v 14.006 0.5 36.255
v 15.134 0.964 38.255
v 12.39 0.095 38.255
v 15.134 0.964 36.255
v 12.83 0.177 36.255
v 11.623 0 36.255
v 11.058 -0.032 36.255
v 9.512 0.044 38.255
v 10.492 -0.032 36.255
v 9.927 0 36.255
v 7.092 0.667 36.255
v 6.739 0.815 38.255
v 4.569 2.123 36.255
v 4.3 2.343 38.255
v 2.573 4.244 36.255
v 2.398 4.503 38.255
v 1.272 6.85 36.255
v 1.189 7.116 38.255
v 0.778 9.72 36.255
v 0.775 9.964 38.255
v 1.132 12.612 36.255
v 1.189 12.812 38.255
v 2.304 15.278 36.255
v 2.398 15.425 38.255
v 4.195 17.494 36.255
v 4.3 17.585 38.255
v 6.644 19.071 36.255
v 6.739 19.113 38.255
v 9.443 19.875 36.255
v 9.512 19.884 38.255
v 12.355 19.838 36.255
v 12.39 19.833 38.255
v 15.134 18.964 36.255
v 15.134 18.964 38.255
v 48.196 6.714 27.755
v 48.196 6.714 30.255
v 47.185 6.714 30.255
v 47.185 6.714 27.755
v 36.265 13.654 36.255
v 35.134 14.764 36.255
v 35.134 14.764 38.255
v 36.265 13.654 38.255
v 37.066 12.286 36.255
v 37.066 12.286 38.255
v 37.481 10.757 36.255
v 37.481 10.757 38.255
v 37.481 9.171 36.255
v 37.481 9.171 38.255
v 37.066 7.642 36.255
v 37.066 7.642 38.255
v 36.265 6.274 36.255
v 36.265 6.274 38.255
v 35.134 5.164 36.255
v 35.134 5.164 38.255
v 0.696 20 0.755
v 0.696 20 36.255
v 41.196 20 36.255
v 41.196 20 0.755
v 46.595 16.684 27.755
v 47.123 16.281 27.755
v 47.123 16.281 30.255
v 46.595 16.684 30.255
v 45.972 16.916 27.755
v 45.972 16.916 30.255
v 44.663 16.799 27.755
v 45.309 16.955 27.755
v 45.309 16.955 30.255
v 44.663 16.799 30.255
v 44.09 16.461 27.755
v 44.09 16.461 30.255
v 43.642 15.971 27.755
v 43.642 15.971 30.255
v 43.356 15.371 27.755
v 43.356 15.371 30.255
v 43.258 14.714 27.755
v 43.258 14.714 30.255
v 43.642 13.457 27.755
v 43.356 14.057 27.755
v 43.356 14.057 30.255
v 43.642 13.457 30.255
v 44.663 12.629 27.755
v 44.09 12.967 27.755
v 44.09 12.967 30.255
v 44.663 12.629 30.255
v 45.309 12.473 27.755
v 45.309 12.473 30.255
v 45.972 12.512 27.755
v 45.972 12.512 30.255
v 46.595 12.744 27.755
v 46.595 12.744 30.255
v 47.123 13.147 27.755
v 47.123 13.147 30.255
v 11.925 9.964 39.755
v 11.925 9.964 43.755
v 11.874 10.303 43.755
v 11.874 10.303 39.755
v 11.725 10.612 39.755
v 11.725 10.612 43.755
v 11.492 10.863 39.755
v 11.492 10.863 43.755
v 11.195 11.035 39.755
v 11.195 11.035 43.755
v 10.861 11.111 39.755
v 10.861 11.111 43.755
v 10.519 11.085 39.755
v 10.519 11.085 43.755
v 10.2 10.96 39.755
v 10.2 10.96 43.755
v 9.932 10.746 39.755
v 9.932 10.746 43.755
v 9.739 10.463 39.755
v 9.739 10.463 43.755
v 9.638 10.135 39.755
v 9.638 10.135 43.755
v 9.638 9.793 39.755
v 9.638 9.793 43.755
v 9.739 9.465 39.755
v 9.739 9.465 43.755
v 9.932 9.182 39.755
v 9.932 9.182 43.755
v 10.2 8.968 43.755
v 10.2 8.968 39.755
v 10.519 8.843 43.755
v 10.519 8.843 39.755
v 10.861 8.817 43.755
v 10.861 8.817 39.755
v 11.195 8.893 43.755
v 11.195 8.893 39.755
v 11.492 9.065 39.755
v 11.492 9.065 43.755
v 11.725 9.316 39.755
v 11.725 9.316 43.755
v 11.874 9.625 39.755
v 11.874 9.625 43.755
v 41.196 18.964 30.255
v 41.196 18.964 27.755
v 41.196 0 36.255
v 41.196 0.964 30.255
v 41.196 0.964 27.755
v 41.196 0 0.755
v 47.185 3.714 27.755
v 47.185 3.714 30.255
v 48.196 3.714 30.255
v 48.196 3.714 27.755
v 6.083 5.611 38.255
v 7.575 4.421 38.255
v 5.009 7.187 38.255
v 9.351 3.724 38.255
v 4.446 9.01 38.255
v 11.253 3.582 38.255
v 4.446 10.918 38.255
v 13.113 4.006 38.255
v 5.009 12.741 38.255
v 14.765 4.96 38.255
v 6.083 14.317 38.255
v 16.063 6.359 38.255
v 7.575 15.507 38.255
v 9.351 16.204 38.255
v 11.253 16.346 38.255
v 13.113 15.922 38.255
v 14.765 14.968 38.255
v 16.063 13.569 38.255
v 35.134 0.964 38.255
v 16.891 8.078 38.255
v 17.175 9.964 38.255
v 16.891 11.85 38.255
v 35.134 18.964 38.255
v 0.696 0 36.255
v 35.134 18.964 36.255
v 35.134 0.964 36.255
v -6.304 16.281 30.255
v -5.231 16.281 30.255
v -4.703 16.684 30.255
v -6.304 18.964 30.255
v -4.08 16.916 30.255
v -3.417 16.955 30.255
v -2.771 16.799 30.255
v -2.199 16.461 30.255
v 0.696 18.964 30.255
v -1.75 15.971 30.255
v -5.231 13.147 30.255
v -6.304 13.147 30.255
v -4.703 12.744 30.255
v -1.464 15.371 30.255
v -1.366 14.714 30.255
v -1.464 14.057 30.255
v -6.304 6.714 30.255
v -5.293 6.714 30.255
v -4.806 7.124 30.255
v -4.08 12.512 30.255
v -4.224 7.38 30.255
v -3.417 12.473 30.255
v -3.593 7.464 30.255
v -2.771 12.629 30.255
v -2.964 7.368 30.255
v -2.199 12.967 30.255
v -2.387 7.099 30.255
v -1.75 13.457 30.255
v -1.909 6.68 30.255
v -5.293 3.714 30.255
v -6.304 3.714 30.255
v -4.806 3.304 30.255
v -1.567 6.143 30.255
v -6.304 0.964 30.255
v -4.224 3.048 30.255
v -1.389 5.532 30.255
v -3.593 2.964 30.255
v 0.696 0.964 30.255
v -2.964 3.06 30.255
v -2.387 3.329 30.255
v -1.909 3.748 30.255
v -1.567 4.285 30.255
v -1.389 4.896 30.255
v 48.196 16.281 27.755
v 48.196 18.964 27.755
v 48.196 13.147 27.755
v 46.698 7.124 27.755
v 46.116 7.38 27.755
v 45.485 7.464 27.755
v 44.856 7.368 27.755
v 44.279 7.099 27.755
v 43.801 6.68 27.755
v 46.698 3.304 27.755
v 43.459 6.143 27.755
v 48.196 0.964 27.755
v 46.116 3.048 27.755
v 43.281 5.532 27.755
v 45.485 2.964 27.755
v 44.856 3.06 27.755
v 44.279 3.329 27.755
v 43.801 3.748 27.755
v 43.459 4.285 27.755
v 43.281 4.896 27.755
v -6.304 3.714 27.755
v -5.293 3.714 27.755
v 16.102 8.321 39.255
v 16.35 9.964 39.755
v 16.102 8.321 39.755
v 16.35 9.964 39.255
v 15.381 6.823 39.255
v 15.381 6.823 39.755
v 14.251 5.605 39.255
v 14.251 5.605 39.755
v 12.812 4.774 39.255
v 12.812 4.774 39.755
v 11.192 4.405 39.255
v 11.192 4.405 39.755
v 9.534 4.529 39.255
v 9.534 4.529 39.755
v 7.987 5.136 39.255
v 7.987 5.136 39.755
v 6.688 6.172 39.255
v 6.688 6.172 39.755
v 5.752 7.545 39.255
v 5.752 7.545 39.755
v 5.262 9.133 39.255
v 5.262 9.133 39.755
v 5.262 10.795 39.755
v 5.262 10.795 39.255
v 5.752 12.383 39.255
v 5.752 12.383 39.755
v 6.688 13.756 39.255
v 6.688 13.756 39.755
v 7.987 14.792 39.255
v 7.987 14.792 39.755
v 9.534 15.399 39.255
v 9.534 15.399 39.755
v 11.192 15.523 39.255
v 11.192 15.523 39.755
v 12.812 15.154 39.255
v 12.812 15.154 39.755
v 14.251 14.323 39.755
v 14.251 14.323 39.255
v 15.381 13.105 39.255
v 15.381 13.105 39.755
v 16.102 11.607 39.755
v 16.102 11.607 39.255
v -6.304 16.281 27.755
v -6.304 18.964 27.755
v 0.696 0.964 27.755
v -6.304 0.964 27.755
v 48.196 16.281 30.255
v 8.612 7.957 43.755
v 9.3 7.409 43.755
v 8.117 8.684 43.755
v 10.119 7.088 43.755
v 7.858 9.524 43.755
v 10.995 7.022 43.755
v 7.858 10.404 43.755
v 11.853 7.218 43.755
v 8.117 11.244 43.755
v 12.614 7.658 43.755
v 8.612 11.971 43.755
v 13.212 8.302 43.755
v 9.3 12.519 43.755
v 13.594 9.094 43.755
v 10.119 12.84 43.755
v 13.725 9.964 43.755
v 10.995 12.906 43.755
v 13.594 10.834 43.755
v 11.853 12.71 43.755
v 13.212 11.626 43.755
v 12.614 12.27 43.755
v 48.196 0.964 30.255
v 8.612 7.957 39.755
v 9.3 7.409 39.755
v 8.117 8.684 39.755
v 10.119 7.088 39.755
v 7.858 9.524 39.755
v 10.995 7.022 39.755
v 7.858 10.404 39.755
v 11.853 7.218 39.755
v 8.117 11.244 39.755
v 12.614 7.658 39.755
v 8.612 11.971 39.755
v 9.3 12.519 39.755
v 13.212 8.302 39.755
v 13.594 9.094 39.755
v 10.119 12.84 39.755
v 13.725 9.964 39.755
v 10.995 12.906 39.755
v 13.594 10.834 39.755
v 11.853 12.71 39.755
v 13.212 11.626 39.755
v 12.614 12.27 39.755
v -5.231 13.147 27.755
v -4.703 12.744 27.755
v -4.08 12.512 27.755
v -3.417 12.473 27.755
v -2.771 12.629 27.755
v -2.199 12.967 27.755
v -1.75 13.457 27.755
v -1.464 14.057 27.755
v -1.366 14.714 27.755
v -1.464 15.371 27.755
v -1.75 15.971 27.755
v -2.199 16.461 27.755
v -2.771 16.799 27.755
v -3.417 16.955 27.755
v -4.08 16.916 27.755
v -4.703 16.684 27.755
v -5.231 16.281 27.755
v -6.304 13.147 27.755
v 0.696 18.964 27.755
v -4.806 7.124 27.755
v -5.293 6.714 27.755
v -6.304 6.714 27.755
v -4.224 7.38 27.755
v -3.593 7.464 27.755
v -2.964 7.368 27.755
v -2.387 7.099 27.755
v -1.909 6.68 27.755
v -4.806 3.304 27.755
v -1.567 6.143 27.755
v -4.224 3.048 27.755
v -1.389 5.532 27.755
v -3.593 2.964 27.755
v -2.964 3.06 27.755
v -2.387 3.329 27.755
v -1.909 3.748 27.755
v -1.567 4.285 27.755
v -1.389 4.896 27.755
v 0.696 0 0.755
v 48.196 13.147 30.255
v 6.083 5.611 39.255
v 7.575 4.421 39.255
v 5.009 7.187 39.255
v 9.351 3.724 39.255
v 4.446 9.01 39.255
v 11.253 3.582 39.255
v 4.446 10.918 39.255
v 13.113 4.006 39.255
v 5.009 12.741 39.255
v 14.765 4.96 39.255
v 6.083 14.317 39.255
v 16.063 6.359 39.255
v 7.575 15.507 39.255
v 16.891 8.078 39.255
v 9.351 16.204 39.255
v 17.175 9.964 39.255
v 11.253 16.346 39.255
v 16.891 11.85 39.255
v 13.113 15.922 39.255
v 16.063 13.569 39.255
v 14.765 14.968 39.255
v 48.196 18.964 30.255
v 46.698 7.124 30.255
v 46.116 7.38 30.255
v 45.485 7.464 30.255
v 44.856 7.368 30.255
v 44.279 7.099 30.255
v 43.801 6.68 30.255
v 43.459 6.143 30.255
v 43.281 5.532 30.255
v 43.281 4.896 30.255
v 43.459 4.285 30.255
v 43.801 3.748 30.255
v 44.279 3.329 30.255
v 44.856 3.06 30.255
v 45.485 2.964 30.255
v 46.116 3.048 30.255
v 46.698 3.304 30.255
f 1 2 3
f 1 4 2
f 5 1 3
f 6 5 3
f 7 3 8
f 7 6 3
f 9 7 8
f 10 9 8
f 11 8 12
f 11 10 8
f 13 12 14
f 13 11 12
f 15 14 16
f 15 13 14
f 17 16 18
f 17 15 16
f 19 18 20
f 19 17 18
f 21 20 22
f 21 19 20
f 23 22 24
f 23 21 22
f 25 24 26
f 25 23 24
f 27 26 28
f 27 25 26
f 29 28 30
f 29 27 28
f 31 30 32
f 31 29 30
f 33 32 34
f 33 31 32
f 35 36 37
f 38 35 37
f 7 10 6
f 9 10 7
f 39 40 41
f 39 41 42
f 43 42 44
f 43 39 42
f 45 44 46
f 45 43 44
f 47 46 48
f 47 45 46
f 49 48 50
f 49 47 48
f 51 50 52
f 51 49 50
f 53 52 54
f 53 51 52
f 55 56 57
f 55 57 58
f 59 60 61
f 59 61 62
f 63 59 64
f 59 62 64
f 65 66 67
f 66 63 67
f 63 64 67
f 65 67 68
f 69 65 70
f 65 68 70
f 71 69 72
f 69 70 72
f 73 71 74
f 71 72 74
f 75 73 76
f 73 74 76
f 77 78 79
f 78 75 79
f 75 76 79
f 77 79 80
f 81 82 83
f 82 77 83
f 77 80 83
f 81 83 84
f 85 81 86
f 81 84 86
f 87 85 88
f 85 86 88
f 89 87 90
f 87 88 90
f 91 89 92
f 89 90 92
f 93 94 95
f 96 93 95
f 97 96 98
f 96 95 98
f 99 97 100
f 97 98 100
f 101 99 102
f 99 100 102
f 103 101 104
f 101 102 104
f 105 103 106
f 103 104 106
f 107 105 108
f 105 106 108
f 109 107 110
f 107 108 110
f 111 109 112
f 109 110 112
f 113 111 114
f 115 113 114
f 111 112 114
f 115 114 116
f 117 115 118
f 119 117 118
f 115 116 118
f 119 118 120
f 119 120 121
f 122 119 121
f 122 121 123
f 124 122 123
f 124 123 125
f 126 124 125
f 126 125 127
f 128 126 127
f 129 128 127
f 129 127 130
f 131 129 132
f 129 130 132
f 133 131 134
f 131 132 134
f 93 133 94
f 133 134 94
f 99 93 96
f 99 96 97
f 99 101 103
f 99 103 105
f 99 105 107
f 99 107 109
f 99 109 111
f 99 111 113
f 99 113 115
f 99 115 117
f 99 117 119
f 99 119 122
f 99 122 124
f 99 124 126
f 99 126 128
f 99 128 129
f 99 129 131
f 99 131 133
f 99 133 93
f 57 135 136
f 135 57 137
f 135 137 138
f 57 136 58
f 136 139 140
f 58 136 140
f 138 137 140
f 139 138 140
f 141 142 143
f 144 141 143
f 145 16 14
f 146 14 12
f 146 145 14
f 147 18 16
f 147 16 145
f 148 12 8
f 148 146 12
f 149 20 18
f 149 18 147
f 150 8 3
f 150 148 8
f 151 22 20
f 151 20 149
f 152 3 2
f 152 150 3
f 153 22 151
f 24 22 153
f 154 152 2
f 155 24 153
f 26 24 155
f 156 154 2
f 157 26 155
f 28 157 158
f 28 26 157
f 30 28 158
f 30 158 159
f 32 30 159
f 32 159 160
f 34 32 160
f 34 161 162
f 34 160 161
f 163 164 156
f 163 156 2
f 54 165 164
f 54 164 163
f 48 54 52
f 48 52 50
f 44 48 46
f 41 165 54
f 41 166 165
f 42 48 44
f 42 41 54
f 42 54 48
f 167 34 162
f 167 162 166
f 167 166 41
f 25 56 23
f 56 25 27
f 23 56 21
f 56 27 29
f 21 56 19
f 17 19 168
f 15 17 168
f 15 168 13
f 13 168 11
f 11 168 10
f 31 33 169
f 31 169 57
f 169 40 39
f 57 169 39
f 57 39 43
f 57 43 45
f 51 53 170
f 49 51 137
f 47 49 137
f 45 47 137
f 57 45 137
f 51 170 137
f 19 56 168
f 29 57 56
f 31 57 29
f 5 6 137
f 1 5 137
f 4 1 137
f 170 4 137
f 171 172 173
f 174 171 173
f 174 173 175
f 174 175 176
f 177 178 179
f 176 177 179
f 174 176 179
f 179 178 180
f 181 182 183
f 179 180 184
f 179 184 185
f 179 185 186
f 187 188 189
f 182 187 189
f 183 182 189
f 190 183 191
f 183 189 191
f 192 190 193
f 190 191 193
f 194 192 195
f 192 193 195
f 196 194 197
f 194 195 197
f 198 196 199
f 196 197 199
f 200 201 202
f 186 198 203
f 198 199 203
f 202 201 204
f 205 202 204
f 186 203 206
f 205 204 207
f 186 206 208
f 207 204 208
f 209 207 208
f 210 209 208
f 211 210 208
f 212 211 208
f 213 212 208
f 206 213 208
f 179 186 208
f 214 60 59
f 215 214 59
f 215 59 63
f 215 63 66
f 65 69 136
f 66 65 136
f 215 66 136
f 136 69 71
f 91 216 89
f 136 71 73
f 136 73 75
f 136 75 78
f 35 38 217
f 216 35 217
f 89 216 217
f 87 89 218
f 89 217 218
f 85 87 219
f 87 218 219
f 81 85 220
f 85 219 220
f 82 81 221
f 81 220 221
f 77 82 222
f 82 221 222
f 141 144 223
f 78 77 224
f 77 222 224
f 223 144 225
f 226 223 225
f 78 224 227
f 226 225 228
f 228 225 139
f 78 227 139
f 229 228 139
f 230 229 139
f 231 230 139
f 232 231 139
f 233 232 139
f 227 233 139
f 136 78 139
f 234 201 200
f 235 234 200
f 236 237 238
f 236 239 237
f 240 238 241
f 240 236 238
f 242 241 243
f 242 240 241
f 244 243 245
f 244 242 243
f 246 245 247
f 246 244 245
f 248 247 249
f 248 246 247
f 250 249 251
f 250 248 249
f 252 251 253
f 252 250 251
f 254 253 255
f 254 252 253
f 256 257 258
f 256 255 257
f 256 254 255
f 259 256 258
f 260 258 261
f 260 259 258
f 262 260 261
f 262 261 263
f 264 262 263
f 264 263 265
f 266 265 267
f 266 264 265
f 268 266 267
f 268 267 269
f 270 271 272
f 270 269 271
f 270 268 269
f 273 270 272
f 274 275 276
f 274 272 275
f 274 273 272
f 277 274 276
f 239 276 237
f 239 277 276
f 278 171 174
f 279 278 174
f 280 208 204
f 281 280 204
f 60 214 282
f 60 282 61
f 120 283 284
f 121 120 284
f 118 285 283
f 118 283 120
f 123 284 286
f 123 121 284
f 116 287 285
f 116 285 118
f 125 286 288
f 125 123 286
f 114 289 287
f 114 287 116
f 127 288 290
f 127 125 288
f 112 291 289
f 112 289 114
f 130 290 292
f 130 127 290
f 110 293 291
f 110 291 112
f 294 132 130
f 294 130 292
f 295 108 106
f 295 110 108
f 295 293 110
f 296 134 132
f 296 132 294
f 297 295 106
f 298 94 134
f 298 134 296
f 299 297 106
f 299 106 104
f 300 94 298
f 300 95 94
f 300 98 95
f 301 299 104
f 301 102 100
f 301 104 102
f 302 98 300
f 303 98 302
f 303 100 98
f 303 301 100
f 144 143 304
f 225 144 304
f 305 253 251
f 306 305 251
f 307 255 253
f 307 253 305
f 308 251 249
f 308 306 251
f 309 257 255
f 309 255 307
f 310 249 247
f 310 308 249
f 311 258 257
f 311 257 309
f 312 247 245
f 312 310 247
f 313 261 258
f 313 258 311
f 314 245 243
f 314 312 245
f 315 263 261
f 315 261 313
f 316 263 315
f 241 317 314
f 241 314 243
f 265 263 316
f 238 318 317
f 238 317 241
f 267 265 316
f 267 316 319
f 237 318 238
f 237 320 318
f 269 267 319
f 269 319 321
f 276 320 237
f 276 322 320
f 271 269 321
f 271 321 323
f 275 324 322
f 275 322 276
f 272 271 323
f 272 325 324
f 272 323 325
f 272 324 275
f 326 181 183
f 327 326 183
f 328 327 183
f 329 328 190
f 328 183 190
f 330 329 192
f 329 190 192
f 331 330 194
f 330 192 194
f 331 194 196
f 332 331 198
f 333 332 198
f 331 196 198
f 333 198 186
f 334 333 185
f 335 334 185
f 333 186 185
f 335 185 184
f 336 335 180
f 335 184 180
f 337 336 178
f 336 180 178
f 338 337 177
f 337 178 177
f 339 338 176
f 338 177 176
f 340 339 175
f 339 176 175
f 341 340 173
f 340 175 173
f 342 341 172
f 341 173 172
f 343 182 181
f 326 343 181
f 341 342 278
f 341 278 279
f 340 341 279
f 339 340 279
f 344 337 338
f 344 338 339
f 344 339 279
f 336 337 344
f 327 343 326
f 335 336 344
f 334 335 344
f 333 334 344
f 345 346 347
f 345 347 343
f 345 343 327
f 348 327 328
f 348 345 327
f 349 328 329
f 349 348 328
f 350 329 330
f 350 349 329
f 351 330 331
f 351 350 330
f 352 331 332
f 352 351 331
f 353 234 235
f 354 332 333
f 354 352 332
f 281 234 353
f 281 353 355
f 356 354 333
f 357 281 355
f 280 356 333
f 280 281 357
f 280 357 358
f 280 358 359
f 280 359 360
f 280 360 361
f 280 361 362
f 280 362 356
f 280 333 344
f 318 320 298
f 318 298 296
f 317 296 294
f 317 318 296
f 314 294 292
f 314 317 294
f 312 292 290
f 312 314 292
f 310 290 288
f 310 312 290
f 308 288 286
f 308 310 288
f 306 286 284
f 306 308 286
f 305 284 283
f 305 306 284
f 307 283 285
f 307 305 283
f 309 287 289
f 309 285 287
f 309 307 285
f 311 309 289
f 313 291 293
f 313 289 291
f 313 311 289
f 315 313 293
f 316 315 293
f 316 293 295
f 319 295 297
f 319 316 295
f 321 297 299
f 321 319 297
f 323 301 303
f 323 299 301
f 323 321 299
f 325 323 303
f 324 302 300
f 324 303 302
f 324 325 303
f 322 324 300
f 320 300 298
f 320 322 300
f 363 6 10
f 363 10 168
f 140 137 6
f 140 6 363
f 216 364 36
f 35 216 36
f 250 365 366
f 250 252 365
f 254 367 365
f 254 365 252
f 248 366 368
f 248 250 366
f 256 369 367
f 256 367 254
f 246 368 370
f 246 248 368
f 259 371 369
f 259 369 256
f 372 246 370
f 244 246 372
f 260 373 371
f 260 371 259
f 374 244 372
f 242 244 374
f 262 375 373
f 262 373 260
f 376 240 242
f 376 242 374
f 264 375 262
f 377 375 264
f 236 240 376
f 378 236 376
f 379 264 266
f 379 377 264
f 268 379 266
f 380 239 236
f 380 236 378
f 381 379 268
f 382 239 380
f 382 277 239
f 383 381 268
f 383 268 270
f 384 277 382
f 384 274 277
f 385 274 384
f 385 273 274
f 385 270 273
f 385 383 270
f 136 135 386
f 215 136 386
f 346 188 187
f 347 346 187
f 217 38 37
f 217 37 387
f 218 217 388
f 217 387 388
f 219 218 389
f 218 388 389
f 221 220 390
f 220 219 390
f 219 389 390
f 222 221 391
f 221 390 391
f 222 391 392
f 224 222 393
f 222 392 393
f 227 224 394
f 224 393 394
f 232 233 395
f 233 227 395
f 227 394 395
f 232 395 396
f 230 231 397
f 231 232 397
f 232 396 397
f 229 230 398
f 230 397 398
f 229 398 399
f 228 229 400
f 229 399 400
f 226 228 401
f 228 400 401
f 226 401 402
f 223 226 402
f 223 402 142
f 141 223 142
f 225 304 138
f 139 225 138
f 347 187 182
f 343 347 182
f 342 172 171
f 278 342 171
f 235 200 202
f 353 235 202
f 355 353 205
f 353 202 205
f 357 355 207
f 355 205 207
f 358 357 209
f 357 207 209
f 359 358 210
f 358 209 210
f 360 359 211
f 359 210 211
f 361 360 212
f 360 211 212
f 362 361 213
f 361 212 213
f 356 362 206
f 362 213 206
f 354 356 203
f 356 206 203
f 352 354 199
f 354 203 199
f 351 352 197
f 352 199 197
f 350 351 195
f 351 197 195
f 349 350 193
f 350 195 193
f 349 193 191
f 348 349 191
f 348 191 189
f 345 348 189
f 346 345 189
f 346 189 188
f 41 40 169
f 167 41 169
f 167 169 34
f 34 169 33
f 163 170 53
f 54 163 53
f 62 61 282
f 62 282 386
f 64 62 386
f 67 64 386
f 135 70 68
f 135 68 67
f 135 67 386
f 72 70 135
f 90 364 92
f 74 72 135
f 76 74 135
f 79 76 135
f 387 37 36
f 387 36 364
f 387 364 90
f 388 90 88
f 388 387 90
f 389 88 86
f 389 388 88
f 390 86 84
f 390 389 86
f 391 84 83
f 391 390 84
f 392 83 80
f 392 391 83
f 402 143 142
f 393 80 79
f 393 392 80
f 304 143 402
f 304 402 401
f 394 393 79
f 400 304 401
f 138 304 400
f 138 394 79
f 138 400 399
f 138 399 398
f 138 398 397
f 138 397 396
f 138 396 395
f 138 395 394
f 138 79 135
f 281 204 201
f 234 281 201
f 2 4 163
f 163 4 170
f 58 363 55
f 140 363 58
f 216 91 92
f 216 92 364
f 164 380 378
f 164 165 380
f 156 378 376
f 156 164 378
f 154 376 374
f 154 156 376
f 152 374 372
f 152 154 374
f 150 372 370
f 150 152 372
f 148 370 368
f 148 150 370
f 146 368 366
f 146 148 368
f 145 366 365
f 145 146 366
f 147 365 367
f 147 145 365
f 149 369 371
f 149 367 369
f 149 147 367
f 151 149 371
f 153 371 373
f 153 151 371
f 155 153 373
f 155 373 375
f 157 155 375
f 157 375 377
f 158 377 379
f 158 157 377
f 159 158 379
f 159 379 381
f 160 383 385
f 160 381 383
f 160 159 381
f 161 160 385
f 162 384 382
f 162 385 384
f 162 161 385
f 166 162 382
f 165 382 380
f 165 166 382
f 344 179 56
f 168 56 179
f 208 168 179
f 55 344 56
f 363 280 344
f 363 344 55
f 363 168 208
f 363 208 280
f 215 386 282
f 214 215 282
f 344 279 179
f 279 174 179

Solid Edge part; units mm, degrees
sketch "Sketch1" plane through (0, 0, 0) normal (0, -1, 0) x (1, 0, 0)
  line L0 (0.6959, 36.2554) -> (0.6959, 0.7554)
  line L1 (0.6959, 0.7554) -> (41.1959, 0.7554)
  line L2 (41.1959, 36.2554) -> (41.1959, 0.7554)
  line L3 (0.6959, 36.2554) -> (41.1959, 36.2554)
  line L4 (-6.3041, 30.2554) -> (0.6959, 30.2554)
  line L5 (0.6959, 30.2554) -> (0.6959, 27.7554)
  line L6 (-6.3041, 27.7554) -> (0.6959, 27.7554)
  line L7 (-6.3041, 27.7554) -> (-6.3041, 30.2554)
  line L8 (48.1959, 27.7554) -> (41.1959, 27.7554)
  line L9 (41.1959, 30.2554) -> (41.1959, 27.7554)
  line L10 (48.1959, 30.2554) -> (41.1959, 30.2554)
  line L11 (48.1959, 27.7554) -> (48.1959, 30.2554)
extrude "Protrusion1" add sketch "Sketch1" against normal blind 20
sketch "Sketch2" plane through (-2.8041, 10, 30.2554) normal (0, 0, 1) x (1, 0, 0)
  line L0 (-3.5, 8.964) -> (3.5, 8.964)
  line L1 (3.5, 8.964) -> (3.5, 10.8897)
  line L2 (3.5, 10.8897) -> (-4.9405, 10.8897)
  line L3 (-4.9405, 10.8897) -> (-4.7039, -10.9349)
  line L4 (-4.7039, -10.9349) -> (3.5, -10.9349)
  line L5 (3.5, -10.9349) -> (3.5, -9.036)
  line L6 (3.5, -9.036) -> (-3.5, -9.036)
  line L7 (-3.5, -9.036) -> (-3.5, -6.286)
  line L8 (-3.5, -6.286) -> (-2.4891, -6.286)
  arc A0 (-2.4891, -6.286) -> (-2.4891, -3.286) centre (-0.812, -4.786) ccw
  line L9 (-2.4891, -3.286) -> (-3.5, -3.286)
  line L10 (-3.5, -3.286) -> (-3.5, 3.1474)
  line L11 (-3.5, 3.1474) -> (-2.4271, 3.1474)
  arc A1 (-2.4271, 3.1474) -> (-2.4271, 6.2806) centre (-0.812, 4.714) ccw
  line L12 (-2.4271, 6.2806) -> (-3.5, 6.2806)
  line L13 (-3.5, 6.2806) -> (-3.5, 8.964)
extrude "Cutout1" cut sketch "Sketch2" against normal up to vertex (2.5 mm away)
mirror "Mirror1" about plane through (20.9459, 10, 18.5054) normal (-1, 0, 0) of "Cutout1"
sketch "Sketch3" plane through (20.9459, 10, 36.2554) normal (0, 0, 1) x (1, 0, 0)
  arc A0 (-5.812, 8.964) -> (-5.812, -9.036) centre (-10.1709, -0.036) ccw
  line L0 (-5.812, -9.036) -> (14.188, -9.036)
  line L1 (14.188, -9.036) -> (14.188, -4.836)
  arc A1 (14.188, -4.836) -> (14.188, 4.764) centre (10.588, -0.036) ccw
  line L2 (14.188, 4.764) -> (14.188, 8.964)
  line L3 (14.188, 8.964) -> (-5.812, 8.964)
extrude "Protrusion2" add sketch "Sketch3" along normal up to vertex (2 mm away)
sketch "Sketch4" plane through (19.1544, 9.964, 38.2554) normal (0, 0, 1) x (1, 0, 0)
  circle A0 centre (-8.3794, 0) radius 6.4
extrude "Protrusion3" add sketch "Sketch4" along normal up to vertex (1 mm away)
sketch "Sketch5" plane through (10.775, 9.964, 39.2554) normal (0, 0, 1) x (1, 0, 0)
  circle A0 centre (0, 0) radius 5.575
extrude "Protrusion4" add sketch "Sketch5" along normal up to vertex (0.5 mm away)
sketch "Sketch6" plane through (10.775, 9.964, 39.7554) normal (0, 0, 1) x (1, 0, 0)
  circle A0 centre (0, 0) radius 2.95
extrude "Protrusion5" add sketch "Sketch6" along normal up to vertex (4 mm away)
sketch "Sketch7" plane through (10.775, 9.964, 43.7554) normal (0, 0, 1) x (1, 0, 0)
  circle A0 centre (0, 0) radius 1.15
extrude "Cutout3" cut sketch "Sketch7" against normal up to vertex (4 mm away)
